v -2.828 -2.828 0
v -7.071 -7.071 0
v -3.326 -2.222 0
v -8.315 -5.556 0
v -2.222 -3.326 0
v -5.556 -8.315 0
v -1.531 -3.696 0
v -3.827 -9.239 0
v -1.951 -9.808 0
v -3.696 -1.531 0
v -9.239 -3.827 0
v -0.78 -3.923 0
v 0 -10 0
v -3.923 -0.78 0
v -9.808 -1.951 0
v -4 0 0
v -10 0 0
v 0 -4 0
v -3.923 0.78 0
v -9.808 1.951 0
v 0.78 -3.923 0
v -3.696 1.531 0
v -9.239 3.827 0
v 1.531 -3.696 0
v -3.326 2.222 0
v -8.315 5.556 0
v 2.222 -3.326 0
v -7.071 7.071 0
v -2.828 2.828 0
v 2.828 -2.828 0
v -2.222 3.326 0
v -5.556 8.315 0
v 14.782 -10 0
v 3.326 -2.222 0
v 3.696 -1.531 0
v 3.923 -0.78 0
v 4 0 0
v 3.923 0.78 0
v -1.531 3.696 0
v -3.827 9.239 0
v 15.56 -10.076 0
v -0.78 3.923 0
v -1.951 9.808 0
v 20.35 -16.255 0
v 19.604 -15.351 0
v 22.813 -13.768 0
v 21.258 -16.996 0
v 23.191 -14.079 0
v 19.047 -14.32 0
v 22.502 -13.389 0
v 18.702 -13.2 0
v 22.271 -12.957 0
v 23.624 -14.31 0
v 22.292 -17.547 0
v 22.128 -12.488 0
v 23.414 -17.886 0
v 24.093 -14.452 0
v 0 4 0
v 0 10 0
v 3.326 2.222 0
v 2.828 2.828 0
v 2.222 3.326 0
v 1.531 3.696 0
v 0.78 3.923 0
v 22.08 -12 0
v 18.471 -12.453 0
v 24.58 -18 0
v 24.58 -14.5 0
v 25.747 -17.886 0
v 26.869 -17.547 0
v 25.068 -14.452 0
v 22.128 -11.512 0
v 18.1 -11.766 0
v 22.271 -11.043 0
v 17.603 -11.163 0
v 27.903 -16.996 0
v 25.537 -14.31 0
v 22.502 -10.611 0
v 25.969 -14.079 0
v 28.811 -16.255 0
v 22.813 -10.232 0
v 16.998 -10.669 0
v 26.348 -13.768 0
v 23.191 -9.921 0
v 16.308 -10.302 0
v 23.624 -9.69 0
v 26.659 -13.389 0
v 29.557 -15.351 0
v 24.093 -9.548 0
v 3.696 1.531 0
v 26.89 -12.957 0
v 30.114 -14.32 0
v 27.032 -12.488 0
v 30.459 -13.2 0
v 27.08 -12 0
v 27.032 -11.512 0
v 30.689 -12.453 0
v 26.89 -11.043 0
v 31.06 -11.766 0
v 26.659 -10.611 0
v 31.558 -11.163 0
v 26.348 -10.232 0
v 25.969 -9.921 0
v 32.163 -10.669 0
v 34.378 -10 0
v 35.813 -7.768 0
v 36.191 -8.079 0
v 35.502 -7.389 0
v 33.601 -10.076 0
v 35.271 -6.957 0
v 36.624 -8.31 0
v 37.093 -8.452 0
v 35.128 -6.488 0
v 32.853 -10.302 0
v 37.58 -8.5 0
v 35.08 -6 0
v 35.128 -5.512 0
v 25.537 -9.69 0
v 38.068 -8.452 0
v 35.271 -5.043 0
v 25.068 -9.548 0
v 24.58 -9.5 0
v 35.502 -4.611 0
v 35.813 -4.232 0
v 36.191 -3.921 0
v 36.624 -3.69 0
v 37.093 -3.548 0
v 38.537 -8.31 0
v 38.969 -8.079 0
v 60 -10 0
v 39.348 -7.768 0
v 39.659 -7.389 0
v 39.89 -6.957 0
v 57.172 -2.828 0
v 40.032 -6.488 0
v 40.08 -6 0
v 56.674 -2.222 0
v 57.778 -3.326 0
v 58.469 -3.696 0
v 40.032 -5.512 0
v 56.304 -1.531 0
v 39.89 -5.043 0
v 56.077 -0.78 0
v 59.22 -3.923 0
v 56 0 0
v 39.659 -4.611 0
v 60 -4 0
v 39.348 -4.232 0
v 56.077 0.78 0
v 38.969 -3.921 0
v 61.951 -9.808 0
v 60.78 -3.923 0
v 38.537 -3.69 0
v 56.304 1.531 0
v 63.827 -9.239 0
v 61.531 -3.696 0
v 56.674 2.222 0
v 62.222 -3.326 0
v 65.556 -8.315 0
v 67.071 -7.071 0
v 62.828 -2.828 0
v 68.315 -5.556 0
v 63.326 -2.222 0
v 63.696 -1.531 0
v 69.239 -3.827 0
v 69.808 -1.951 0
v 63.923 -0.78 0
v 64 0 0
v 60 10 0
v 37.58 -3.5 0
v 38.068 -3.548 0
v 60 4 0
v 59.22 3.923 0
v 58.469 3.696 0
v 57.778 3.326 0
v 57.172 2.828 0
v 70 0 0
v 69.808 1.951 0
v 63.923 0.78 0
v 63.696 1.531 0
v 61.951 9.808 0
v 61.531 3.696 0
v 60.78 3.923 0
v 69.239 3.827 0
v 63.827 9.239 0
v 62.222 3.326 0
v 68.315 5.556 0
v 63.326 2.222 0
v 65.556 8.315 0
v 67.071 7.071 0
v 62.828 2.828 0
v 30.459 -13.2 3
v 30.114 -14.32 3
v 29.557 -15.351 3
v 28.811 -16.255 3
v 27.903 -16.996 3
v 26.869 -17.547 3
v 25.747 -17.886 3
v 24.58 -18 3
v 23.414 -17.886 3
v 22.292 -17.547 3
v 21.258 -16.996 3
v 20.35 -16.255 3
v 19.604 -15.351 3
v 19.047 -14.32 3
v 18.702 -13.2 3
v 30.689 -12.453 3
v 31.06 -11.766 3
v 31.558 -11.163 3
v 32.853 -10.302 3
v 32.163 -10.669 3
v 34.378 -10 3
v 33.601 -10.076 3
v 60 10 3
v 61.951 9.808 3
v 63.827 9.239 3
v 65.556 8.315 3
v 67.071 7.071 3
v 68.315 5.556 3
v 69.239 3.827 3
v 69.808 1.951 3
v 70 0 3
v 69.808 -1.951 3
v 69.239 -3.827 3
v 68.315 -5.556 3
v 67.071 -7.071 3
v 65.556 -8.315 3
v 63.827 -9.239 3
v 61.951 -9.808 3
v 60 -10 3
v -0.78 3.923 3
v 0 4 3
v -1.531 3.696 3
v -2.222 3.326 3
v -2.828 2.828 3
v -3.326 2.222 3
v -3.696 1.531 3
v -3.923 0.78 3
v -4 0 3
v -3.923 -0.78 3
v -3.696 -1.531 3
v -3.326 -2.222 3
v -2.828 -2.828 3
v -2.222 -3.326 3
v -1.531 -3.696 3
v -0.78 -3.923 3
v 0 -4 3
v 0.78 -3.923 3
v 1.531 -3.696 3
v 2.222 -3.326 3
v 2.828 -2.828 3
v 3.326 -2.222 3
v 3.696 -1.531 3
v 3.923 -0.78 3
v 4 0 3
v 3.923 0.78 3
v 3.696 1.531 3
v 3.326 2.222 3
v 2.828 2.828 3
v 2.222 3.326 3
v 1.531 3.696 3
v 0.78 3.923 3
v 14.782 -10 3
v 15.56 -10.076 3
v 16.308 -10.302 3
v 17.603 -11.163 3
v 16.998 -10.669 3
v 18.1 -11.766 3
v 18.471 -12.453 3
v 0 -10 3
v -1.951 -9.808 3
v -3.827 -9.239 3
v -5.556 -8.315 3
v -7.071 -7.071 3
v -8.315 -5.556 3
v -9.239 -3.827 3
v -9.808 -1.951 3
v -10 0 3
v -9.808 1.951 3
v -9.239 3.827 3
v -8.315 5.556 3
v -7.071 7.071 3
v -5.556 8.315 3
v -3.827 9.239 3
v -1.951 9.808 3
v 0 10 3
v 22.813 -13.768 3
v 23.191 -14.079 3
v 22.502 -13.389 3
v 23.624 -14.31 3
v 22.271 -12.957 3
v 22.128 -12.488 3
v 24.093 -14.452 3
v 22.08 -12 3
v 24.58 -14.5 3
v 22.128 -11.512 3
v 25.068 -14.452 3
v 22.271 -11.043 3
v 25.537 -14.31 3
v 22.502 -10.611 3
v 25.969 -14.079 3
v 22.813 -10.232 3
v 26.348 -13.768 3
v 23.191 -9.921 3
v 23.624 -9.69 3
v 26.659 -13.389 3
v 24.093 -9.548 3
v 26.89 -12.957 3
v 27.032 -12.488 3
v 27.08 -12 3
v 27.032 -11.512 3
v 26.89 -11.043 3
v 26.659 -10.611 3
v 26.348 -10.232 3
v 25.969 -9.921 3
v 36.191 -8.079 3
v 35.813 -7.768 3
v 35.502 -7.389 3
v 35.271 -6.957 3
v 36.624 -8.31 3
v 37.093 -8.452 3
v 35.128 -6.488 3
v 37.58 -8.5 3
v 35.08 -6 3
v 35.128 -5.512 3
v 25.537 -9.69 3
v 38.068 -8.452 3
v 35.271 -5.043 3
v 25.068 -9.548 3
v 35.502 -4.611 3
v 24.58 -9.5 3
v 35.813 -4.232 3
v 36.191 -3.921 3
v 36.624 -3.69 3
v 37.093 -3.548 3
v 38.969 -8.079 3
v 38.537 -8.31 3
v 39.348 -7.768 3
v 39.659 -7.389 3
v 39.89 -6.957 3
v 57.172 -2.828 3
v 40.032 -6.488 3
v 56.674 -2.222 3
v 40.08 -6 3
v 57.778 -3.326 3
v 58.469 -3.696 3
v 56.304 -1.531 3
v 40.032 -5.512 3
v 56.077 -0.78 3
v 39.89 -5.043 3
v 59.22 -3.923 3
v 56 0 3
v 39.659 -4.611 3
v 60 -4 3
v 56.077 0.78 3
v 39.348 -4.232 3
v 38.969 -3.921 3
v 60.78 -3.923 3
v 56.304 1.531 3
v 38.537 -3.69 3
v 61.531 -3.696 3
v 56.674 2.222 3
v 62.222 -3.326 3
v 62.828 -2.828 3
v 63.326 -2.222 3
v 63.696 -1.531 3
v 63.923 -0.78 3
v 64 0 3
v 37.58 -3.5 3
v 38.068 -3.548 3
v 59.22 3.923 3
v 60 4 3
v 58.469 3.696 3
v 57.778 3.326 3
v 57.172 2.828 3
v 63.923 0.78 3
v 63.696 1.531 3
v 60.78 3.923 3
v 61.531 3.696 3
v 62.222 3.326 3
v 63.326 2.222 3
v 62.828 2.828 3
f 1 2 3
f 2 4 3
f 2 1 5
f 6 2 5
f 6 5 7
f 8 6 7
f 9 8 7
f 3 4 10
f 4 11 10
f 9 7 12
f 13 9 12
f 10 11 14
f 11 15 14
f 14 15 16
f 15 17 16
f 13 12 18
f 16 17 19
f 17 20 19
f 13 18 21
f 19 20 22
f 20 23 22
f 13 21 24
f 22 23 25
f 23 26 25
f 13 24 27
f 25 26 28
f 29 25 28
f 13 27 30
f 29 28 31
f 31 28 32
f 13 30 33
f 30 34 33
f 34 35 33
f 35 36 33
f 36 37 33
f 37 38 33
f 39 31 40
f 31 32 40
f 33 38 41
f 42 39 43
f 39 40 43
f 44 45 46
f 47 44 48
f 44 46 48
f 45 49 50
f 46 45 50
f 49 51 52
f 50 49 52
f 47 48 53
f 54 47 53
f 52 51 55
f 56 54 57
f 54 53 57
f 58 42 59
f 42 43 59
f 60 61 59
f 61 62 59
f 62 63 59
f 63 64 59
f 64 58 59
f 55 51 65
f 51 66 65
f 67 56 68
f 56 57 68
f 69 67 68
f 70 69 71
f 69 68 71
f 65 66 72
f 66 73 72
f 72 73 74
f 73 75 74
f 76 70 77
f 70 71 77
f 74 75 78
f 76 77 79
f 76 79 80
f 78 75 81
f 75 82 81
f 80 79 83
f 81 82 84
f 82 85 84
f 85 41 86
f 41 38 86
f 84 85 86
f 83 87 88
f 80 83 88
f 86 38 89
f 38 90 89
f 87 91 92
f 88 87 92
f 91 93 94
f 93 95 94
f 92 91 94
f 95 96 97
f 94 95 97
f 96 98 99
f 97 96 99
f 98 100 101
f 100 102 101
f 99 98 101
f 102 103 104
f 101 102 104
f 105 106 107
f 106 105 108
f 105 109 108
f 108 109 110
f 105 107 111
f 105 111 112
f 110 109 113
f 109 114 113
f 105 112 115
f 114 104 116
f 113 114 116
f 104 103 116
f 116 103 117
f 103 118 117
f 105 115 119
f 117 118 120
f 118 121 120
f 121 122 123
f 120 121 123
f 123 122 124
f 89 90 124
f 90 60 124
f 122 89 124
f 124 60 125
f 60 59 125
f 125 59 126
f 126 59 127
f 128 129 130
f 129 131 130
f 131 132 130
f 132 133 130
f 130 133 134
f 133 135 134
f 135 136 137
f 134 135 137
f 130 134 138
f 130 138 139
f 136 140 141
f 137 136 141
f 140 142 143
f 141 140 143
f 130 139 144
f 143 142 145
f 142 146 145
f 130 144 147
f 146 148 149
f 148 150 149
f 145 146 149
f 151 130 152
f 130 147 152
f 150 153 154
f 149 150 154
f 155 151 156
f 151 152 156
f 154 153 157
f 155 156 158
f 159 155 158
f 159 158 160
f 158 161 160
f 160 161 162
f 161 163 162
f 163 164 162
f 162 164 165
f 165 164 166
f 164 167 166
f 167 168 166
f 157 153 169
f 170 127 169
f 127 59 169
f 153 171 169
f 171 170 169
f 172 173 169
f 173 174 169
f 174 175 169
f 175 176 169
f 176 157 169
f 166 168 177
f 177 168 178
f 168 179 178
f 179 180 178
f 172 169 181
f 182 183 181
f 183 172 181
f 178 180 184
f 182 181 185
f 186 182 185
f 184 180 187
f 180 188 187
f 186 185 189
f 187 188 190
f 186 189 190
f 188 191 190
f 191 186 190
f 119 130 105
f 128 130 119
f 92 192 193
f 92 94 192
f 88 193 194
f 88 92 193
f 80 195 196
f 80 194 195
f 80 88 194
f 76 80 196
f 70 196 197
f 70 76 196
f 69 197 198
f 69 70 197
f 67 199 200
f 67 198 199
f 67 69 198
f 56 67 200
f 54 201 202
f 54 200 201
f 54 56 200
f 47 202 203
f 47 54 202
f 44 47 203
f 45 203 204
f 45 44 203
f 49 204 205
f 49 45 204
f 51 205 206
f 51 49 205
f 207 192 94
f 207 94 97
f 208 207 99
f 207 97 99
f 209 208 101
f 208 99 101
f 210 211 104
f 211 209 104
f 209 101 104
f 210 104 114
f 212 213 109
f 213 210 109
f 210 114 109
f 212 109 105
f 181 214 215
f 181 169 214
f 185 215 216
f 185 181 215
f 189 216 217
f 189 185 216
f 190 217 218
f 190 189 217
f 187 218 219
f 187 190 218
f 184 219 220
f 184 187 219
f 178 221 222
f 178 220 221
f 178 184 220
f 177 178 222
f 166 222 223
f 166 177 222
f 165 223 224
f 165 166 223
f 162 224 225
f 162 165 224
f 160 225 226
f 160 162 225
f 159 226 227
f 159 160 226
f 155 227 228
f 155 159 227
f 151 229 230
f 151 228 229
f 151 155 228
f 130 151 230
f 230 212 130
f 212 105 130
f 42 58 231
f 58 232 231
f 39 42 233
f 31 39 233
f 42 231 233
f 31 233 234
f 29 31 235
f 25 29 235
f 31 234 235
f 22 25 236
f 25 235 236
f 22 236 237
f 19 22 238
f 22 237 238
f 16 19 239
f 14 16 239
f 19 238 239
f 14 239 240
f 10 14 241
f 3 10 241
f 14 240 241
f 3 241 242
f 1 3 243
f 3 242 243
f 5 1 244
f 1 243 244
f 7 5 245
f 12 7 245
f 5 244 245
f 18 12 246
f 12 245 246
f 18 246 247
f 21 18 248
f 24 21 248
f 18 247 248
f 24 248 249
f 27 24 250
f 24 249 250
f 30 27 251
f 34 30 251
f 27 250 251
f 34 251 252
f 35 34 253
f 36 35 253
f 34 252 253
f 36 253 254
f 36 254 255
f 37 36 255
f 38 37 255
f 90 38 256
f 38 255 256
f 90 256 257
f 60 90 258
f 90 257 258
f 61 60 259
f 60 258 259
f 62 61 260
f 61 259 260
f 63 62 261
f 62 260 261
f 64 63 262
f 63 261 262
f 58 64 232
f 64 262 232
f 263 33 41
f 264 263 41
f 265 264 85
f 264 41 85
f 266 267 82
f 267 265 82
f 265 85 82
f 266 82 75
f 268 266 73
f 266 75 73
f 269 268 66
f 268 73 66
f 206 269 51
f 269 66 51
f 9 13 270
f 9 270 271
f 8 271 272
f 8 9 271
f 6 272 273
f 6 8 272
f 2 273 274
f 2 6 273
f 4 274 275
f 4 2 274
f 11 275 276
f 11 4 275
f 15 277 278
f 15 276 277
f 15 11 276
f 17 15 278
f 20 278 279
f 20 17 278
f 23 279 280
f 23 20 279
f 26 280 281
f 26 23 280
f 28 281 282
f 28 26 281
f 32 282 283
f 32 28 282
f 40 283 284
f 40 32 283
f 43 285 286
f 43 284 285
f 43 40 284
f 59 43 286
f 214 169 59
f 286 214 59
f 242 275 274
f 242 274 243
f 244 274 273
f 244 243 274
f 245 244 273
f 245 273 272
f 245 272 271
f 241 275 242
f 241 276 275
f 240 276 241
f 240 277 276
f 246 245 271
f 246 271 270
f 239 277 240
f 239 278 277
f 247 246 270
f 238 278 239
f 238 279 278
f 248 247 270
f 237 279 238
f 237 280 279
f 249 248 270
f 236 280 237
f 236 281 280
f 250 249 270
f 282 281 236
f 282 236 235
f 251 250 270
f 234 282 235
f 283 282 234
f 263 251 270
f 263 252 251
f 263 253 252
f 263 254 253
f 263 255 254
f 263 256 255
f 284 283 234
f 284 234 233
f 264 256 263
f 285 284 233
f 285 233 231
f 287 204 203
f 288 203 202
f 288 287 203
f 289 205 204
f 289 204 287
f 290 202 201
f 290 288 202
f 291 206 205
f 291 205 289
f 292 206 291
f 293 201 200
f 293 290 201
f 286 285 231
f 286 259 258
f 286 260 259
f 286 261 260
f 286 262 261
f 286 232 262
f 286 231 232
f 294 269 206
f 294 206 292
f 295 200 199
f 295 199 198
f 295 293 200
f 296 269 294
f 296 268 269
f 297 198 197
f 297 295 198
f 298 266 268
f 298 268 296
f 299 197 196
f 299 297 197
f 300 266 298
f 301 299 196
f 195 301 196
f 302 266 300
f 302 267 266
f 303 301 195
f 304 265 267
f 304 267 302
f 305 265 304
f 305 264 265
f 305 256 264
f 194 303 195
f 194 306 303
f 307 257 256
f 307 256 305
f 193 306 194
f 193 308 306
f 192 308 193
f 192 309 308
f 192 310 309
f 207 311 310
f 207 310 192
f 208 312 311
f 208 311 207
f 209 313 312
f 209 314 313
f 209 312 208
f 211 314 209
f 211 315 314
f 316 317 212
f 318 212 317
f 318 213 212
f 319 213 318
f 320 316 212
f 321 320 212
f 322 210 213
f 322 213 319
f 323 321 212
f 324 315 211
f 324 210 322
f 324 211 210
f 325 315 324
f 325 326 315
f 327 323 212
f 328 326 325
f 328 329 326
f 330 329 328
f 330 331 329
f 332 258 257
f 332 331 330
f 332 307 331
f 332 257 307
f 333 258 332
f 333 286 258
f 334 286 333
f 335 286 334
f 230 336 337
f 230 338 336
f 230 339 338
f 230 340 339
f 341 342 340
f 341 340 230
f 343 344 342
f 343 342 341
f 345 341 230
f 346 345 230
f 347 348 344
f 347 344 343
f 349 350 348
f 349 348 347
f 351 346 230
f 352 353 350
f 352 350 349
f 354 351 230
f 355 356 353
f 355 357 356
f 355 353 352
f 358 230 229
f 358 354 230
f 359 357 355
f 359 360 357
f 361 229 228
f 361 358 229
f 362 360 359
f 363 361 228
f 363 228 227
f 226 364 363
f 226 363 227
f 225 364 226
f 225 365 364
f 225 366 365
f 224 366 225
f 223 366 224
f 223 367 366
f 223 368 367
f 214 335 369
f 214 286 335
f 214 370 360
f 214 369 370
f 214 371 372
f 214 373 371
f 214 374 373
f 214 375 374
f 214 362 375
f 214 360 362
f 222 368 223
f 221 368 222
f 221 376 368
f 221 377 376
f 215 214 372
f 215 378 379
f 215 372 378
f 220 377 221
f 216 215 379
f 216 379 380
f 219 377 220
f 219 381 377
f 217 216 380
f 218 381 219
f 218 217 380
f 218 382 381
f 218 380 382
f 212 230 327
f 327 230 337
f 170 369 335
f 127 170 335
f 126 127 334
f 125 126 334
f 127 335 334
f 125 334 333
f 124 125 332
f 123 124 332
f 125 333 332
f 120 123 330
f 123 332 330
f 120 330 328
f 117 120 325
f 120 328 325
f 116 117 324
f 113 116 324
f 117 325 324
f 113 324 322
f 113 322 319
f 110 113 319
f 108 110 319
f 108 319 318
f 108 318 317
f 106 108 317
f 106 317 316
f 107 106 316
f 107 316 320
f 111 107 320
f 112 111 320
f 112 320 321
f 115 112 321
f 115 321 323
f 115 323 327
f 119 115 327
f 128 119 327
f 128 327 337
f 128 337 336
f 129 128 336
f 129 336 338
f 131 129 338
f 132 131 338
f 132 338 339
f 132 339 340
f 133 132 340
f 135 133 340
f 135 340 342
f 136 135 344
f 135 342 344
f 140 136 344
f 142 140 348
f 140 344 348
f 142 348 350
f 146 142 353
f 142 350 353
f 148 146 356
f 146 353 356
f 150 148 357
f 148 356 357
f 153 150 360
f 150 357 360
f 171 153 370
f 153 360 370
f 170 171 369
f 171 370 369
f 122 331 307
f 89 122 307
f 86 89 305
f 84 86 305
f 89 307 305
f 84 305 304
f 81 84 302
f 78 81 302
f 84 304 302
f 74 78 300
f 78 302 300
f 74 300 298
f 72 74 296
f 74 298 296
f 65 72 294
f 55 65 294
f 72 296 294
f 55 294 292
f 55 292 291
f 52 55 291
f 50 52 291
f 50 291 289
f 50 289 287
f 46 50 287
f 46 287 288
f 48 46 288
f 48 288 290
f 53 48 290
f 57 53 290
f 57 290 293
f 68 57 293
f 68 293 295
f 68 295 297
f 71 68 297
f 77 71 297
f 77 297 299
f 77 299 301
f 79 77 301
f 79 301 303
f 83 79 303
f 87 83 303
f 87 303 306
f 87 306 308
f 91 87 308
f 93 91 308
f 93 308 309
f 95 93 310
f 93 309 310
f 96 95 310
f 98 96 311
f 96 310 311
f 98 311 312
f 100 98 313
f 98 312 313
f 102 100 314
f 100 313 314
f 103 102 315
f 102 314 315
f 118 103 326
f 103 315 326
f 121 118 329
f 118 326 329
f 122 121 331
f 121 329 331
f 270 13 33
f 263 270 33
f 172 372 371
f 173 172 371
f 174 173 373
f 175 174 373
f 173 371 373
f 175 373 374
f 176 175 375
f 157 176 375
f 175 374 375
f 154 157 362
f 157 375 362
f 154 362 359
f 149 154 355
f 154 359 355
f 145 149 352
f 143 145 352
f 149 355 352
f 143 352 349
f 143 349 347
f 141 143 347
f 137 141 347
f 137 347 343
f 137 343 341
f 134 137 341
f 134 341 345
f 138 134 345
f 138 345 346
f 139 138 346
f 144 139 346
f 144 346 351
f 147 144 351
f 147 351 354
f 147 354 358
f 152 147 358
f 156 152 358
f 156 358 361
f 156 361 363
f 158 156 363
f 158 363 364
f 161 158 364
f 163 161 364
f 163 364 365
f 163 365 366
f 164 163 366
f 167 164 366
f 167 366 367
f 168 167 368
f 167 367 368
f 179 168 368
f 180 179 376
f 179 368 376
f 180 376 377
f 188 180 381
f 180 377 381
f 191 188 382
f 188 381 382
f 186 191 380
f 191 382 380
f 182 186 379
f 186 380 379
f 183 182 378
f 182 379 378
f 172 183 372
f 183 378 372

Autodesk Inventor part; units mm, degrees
ref_plane "YZ Plane" through (0, 0, 0) normal (1, 0, 0) x (0, 1, 0)
ref_plane "XZ Plane" through (0, 0, 0) normal (0, 1, 0) x (-1, 0, 0)
ref_plane "XY Plane" through (0, 0, 0) normal (0, 0, 1) x (1, 0, 0)
sketch "Szkic1" plane through (0, 0, 0) normal (0, 0, 1) x (1, 0, 0)
  line L0 (0, 0) -> (60, 0) construction
  line L1 (0, -10) -> (14.7824, -10)
  line L2 (60, 10) -> (0, 10)
  arc A0 (0, 10) -> (0, -10) centre (0, 0) ccw
  arc A1 (60, -10) -> (60, 10) centre (60, 0) ccw
  arc A2 (30.2373, -10) -> (18.9235, -10) centre (24.5804, -12) ccw construction
  arc A3 (18.7016, -13.2) -> (30.4592, -13.2) centre (24.5804, -12) ccw
  line L3 (34.3784, -10) -> (60, -10)
  line L4 (18.9235, -10) -> (30.2373, -10)
  arc A4 (34.3784, -10) -> (30.4592, -13.2) centre (34.3784, -14) ccw
  arc A5 (18.7016, -13.2) -> (14.7824, -10) centre (14.7824, -14) ccw
  point P0 (30, 0)
  point P1 (37.5804, -6)
  point P2 (29.5804, -5)
  dimension "d0" = 60
  dimension "d1" = 20
  dimension "d20" = 12
  dimension "d21" = 4
  dimension "d22" = 13
  dimension "d23" = 6
  dimension "d24" = 30
  dimension "d25" = 1
  dimension "d26" = 8
  dimension "d27" = 5
extrude "Wyciągnięcie proste1" add sketch "Szkic1" along normal blind 3
hole "Otwór1" at (0, 0, 0) at (60, 0, 0) direction (0, 0, 1) diameter 8 end through all
hole "Otwór2" at (37.5804, -6, 0) at (24.5804, -12, 0) direction (0, 0, 1) diameter 5 end through all
properties part number "ramie_1_wahacza"
